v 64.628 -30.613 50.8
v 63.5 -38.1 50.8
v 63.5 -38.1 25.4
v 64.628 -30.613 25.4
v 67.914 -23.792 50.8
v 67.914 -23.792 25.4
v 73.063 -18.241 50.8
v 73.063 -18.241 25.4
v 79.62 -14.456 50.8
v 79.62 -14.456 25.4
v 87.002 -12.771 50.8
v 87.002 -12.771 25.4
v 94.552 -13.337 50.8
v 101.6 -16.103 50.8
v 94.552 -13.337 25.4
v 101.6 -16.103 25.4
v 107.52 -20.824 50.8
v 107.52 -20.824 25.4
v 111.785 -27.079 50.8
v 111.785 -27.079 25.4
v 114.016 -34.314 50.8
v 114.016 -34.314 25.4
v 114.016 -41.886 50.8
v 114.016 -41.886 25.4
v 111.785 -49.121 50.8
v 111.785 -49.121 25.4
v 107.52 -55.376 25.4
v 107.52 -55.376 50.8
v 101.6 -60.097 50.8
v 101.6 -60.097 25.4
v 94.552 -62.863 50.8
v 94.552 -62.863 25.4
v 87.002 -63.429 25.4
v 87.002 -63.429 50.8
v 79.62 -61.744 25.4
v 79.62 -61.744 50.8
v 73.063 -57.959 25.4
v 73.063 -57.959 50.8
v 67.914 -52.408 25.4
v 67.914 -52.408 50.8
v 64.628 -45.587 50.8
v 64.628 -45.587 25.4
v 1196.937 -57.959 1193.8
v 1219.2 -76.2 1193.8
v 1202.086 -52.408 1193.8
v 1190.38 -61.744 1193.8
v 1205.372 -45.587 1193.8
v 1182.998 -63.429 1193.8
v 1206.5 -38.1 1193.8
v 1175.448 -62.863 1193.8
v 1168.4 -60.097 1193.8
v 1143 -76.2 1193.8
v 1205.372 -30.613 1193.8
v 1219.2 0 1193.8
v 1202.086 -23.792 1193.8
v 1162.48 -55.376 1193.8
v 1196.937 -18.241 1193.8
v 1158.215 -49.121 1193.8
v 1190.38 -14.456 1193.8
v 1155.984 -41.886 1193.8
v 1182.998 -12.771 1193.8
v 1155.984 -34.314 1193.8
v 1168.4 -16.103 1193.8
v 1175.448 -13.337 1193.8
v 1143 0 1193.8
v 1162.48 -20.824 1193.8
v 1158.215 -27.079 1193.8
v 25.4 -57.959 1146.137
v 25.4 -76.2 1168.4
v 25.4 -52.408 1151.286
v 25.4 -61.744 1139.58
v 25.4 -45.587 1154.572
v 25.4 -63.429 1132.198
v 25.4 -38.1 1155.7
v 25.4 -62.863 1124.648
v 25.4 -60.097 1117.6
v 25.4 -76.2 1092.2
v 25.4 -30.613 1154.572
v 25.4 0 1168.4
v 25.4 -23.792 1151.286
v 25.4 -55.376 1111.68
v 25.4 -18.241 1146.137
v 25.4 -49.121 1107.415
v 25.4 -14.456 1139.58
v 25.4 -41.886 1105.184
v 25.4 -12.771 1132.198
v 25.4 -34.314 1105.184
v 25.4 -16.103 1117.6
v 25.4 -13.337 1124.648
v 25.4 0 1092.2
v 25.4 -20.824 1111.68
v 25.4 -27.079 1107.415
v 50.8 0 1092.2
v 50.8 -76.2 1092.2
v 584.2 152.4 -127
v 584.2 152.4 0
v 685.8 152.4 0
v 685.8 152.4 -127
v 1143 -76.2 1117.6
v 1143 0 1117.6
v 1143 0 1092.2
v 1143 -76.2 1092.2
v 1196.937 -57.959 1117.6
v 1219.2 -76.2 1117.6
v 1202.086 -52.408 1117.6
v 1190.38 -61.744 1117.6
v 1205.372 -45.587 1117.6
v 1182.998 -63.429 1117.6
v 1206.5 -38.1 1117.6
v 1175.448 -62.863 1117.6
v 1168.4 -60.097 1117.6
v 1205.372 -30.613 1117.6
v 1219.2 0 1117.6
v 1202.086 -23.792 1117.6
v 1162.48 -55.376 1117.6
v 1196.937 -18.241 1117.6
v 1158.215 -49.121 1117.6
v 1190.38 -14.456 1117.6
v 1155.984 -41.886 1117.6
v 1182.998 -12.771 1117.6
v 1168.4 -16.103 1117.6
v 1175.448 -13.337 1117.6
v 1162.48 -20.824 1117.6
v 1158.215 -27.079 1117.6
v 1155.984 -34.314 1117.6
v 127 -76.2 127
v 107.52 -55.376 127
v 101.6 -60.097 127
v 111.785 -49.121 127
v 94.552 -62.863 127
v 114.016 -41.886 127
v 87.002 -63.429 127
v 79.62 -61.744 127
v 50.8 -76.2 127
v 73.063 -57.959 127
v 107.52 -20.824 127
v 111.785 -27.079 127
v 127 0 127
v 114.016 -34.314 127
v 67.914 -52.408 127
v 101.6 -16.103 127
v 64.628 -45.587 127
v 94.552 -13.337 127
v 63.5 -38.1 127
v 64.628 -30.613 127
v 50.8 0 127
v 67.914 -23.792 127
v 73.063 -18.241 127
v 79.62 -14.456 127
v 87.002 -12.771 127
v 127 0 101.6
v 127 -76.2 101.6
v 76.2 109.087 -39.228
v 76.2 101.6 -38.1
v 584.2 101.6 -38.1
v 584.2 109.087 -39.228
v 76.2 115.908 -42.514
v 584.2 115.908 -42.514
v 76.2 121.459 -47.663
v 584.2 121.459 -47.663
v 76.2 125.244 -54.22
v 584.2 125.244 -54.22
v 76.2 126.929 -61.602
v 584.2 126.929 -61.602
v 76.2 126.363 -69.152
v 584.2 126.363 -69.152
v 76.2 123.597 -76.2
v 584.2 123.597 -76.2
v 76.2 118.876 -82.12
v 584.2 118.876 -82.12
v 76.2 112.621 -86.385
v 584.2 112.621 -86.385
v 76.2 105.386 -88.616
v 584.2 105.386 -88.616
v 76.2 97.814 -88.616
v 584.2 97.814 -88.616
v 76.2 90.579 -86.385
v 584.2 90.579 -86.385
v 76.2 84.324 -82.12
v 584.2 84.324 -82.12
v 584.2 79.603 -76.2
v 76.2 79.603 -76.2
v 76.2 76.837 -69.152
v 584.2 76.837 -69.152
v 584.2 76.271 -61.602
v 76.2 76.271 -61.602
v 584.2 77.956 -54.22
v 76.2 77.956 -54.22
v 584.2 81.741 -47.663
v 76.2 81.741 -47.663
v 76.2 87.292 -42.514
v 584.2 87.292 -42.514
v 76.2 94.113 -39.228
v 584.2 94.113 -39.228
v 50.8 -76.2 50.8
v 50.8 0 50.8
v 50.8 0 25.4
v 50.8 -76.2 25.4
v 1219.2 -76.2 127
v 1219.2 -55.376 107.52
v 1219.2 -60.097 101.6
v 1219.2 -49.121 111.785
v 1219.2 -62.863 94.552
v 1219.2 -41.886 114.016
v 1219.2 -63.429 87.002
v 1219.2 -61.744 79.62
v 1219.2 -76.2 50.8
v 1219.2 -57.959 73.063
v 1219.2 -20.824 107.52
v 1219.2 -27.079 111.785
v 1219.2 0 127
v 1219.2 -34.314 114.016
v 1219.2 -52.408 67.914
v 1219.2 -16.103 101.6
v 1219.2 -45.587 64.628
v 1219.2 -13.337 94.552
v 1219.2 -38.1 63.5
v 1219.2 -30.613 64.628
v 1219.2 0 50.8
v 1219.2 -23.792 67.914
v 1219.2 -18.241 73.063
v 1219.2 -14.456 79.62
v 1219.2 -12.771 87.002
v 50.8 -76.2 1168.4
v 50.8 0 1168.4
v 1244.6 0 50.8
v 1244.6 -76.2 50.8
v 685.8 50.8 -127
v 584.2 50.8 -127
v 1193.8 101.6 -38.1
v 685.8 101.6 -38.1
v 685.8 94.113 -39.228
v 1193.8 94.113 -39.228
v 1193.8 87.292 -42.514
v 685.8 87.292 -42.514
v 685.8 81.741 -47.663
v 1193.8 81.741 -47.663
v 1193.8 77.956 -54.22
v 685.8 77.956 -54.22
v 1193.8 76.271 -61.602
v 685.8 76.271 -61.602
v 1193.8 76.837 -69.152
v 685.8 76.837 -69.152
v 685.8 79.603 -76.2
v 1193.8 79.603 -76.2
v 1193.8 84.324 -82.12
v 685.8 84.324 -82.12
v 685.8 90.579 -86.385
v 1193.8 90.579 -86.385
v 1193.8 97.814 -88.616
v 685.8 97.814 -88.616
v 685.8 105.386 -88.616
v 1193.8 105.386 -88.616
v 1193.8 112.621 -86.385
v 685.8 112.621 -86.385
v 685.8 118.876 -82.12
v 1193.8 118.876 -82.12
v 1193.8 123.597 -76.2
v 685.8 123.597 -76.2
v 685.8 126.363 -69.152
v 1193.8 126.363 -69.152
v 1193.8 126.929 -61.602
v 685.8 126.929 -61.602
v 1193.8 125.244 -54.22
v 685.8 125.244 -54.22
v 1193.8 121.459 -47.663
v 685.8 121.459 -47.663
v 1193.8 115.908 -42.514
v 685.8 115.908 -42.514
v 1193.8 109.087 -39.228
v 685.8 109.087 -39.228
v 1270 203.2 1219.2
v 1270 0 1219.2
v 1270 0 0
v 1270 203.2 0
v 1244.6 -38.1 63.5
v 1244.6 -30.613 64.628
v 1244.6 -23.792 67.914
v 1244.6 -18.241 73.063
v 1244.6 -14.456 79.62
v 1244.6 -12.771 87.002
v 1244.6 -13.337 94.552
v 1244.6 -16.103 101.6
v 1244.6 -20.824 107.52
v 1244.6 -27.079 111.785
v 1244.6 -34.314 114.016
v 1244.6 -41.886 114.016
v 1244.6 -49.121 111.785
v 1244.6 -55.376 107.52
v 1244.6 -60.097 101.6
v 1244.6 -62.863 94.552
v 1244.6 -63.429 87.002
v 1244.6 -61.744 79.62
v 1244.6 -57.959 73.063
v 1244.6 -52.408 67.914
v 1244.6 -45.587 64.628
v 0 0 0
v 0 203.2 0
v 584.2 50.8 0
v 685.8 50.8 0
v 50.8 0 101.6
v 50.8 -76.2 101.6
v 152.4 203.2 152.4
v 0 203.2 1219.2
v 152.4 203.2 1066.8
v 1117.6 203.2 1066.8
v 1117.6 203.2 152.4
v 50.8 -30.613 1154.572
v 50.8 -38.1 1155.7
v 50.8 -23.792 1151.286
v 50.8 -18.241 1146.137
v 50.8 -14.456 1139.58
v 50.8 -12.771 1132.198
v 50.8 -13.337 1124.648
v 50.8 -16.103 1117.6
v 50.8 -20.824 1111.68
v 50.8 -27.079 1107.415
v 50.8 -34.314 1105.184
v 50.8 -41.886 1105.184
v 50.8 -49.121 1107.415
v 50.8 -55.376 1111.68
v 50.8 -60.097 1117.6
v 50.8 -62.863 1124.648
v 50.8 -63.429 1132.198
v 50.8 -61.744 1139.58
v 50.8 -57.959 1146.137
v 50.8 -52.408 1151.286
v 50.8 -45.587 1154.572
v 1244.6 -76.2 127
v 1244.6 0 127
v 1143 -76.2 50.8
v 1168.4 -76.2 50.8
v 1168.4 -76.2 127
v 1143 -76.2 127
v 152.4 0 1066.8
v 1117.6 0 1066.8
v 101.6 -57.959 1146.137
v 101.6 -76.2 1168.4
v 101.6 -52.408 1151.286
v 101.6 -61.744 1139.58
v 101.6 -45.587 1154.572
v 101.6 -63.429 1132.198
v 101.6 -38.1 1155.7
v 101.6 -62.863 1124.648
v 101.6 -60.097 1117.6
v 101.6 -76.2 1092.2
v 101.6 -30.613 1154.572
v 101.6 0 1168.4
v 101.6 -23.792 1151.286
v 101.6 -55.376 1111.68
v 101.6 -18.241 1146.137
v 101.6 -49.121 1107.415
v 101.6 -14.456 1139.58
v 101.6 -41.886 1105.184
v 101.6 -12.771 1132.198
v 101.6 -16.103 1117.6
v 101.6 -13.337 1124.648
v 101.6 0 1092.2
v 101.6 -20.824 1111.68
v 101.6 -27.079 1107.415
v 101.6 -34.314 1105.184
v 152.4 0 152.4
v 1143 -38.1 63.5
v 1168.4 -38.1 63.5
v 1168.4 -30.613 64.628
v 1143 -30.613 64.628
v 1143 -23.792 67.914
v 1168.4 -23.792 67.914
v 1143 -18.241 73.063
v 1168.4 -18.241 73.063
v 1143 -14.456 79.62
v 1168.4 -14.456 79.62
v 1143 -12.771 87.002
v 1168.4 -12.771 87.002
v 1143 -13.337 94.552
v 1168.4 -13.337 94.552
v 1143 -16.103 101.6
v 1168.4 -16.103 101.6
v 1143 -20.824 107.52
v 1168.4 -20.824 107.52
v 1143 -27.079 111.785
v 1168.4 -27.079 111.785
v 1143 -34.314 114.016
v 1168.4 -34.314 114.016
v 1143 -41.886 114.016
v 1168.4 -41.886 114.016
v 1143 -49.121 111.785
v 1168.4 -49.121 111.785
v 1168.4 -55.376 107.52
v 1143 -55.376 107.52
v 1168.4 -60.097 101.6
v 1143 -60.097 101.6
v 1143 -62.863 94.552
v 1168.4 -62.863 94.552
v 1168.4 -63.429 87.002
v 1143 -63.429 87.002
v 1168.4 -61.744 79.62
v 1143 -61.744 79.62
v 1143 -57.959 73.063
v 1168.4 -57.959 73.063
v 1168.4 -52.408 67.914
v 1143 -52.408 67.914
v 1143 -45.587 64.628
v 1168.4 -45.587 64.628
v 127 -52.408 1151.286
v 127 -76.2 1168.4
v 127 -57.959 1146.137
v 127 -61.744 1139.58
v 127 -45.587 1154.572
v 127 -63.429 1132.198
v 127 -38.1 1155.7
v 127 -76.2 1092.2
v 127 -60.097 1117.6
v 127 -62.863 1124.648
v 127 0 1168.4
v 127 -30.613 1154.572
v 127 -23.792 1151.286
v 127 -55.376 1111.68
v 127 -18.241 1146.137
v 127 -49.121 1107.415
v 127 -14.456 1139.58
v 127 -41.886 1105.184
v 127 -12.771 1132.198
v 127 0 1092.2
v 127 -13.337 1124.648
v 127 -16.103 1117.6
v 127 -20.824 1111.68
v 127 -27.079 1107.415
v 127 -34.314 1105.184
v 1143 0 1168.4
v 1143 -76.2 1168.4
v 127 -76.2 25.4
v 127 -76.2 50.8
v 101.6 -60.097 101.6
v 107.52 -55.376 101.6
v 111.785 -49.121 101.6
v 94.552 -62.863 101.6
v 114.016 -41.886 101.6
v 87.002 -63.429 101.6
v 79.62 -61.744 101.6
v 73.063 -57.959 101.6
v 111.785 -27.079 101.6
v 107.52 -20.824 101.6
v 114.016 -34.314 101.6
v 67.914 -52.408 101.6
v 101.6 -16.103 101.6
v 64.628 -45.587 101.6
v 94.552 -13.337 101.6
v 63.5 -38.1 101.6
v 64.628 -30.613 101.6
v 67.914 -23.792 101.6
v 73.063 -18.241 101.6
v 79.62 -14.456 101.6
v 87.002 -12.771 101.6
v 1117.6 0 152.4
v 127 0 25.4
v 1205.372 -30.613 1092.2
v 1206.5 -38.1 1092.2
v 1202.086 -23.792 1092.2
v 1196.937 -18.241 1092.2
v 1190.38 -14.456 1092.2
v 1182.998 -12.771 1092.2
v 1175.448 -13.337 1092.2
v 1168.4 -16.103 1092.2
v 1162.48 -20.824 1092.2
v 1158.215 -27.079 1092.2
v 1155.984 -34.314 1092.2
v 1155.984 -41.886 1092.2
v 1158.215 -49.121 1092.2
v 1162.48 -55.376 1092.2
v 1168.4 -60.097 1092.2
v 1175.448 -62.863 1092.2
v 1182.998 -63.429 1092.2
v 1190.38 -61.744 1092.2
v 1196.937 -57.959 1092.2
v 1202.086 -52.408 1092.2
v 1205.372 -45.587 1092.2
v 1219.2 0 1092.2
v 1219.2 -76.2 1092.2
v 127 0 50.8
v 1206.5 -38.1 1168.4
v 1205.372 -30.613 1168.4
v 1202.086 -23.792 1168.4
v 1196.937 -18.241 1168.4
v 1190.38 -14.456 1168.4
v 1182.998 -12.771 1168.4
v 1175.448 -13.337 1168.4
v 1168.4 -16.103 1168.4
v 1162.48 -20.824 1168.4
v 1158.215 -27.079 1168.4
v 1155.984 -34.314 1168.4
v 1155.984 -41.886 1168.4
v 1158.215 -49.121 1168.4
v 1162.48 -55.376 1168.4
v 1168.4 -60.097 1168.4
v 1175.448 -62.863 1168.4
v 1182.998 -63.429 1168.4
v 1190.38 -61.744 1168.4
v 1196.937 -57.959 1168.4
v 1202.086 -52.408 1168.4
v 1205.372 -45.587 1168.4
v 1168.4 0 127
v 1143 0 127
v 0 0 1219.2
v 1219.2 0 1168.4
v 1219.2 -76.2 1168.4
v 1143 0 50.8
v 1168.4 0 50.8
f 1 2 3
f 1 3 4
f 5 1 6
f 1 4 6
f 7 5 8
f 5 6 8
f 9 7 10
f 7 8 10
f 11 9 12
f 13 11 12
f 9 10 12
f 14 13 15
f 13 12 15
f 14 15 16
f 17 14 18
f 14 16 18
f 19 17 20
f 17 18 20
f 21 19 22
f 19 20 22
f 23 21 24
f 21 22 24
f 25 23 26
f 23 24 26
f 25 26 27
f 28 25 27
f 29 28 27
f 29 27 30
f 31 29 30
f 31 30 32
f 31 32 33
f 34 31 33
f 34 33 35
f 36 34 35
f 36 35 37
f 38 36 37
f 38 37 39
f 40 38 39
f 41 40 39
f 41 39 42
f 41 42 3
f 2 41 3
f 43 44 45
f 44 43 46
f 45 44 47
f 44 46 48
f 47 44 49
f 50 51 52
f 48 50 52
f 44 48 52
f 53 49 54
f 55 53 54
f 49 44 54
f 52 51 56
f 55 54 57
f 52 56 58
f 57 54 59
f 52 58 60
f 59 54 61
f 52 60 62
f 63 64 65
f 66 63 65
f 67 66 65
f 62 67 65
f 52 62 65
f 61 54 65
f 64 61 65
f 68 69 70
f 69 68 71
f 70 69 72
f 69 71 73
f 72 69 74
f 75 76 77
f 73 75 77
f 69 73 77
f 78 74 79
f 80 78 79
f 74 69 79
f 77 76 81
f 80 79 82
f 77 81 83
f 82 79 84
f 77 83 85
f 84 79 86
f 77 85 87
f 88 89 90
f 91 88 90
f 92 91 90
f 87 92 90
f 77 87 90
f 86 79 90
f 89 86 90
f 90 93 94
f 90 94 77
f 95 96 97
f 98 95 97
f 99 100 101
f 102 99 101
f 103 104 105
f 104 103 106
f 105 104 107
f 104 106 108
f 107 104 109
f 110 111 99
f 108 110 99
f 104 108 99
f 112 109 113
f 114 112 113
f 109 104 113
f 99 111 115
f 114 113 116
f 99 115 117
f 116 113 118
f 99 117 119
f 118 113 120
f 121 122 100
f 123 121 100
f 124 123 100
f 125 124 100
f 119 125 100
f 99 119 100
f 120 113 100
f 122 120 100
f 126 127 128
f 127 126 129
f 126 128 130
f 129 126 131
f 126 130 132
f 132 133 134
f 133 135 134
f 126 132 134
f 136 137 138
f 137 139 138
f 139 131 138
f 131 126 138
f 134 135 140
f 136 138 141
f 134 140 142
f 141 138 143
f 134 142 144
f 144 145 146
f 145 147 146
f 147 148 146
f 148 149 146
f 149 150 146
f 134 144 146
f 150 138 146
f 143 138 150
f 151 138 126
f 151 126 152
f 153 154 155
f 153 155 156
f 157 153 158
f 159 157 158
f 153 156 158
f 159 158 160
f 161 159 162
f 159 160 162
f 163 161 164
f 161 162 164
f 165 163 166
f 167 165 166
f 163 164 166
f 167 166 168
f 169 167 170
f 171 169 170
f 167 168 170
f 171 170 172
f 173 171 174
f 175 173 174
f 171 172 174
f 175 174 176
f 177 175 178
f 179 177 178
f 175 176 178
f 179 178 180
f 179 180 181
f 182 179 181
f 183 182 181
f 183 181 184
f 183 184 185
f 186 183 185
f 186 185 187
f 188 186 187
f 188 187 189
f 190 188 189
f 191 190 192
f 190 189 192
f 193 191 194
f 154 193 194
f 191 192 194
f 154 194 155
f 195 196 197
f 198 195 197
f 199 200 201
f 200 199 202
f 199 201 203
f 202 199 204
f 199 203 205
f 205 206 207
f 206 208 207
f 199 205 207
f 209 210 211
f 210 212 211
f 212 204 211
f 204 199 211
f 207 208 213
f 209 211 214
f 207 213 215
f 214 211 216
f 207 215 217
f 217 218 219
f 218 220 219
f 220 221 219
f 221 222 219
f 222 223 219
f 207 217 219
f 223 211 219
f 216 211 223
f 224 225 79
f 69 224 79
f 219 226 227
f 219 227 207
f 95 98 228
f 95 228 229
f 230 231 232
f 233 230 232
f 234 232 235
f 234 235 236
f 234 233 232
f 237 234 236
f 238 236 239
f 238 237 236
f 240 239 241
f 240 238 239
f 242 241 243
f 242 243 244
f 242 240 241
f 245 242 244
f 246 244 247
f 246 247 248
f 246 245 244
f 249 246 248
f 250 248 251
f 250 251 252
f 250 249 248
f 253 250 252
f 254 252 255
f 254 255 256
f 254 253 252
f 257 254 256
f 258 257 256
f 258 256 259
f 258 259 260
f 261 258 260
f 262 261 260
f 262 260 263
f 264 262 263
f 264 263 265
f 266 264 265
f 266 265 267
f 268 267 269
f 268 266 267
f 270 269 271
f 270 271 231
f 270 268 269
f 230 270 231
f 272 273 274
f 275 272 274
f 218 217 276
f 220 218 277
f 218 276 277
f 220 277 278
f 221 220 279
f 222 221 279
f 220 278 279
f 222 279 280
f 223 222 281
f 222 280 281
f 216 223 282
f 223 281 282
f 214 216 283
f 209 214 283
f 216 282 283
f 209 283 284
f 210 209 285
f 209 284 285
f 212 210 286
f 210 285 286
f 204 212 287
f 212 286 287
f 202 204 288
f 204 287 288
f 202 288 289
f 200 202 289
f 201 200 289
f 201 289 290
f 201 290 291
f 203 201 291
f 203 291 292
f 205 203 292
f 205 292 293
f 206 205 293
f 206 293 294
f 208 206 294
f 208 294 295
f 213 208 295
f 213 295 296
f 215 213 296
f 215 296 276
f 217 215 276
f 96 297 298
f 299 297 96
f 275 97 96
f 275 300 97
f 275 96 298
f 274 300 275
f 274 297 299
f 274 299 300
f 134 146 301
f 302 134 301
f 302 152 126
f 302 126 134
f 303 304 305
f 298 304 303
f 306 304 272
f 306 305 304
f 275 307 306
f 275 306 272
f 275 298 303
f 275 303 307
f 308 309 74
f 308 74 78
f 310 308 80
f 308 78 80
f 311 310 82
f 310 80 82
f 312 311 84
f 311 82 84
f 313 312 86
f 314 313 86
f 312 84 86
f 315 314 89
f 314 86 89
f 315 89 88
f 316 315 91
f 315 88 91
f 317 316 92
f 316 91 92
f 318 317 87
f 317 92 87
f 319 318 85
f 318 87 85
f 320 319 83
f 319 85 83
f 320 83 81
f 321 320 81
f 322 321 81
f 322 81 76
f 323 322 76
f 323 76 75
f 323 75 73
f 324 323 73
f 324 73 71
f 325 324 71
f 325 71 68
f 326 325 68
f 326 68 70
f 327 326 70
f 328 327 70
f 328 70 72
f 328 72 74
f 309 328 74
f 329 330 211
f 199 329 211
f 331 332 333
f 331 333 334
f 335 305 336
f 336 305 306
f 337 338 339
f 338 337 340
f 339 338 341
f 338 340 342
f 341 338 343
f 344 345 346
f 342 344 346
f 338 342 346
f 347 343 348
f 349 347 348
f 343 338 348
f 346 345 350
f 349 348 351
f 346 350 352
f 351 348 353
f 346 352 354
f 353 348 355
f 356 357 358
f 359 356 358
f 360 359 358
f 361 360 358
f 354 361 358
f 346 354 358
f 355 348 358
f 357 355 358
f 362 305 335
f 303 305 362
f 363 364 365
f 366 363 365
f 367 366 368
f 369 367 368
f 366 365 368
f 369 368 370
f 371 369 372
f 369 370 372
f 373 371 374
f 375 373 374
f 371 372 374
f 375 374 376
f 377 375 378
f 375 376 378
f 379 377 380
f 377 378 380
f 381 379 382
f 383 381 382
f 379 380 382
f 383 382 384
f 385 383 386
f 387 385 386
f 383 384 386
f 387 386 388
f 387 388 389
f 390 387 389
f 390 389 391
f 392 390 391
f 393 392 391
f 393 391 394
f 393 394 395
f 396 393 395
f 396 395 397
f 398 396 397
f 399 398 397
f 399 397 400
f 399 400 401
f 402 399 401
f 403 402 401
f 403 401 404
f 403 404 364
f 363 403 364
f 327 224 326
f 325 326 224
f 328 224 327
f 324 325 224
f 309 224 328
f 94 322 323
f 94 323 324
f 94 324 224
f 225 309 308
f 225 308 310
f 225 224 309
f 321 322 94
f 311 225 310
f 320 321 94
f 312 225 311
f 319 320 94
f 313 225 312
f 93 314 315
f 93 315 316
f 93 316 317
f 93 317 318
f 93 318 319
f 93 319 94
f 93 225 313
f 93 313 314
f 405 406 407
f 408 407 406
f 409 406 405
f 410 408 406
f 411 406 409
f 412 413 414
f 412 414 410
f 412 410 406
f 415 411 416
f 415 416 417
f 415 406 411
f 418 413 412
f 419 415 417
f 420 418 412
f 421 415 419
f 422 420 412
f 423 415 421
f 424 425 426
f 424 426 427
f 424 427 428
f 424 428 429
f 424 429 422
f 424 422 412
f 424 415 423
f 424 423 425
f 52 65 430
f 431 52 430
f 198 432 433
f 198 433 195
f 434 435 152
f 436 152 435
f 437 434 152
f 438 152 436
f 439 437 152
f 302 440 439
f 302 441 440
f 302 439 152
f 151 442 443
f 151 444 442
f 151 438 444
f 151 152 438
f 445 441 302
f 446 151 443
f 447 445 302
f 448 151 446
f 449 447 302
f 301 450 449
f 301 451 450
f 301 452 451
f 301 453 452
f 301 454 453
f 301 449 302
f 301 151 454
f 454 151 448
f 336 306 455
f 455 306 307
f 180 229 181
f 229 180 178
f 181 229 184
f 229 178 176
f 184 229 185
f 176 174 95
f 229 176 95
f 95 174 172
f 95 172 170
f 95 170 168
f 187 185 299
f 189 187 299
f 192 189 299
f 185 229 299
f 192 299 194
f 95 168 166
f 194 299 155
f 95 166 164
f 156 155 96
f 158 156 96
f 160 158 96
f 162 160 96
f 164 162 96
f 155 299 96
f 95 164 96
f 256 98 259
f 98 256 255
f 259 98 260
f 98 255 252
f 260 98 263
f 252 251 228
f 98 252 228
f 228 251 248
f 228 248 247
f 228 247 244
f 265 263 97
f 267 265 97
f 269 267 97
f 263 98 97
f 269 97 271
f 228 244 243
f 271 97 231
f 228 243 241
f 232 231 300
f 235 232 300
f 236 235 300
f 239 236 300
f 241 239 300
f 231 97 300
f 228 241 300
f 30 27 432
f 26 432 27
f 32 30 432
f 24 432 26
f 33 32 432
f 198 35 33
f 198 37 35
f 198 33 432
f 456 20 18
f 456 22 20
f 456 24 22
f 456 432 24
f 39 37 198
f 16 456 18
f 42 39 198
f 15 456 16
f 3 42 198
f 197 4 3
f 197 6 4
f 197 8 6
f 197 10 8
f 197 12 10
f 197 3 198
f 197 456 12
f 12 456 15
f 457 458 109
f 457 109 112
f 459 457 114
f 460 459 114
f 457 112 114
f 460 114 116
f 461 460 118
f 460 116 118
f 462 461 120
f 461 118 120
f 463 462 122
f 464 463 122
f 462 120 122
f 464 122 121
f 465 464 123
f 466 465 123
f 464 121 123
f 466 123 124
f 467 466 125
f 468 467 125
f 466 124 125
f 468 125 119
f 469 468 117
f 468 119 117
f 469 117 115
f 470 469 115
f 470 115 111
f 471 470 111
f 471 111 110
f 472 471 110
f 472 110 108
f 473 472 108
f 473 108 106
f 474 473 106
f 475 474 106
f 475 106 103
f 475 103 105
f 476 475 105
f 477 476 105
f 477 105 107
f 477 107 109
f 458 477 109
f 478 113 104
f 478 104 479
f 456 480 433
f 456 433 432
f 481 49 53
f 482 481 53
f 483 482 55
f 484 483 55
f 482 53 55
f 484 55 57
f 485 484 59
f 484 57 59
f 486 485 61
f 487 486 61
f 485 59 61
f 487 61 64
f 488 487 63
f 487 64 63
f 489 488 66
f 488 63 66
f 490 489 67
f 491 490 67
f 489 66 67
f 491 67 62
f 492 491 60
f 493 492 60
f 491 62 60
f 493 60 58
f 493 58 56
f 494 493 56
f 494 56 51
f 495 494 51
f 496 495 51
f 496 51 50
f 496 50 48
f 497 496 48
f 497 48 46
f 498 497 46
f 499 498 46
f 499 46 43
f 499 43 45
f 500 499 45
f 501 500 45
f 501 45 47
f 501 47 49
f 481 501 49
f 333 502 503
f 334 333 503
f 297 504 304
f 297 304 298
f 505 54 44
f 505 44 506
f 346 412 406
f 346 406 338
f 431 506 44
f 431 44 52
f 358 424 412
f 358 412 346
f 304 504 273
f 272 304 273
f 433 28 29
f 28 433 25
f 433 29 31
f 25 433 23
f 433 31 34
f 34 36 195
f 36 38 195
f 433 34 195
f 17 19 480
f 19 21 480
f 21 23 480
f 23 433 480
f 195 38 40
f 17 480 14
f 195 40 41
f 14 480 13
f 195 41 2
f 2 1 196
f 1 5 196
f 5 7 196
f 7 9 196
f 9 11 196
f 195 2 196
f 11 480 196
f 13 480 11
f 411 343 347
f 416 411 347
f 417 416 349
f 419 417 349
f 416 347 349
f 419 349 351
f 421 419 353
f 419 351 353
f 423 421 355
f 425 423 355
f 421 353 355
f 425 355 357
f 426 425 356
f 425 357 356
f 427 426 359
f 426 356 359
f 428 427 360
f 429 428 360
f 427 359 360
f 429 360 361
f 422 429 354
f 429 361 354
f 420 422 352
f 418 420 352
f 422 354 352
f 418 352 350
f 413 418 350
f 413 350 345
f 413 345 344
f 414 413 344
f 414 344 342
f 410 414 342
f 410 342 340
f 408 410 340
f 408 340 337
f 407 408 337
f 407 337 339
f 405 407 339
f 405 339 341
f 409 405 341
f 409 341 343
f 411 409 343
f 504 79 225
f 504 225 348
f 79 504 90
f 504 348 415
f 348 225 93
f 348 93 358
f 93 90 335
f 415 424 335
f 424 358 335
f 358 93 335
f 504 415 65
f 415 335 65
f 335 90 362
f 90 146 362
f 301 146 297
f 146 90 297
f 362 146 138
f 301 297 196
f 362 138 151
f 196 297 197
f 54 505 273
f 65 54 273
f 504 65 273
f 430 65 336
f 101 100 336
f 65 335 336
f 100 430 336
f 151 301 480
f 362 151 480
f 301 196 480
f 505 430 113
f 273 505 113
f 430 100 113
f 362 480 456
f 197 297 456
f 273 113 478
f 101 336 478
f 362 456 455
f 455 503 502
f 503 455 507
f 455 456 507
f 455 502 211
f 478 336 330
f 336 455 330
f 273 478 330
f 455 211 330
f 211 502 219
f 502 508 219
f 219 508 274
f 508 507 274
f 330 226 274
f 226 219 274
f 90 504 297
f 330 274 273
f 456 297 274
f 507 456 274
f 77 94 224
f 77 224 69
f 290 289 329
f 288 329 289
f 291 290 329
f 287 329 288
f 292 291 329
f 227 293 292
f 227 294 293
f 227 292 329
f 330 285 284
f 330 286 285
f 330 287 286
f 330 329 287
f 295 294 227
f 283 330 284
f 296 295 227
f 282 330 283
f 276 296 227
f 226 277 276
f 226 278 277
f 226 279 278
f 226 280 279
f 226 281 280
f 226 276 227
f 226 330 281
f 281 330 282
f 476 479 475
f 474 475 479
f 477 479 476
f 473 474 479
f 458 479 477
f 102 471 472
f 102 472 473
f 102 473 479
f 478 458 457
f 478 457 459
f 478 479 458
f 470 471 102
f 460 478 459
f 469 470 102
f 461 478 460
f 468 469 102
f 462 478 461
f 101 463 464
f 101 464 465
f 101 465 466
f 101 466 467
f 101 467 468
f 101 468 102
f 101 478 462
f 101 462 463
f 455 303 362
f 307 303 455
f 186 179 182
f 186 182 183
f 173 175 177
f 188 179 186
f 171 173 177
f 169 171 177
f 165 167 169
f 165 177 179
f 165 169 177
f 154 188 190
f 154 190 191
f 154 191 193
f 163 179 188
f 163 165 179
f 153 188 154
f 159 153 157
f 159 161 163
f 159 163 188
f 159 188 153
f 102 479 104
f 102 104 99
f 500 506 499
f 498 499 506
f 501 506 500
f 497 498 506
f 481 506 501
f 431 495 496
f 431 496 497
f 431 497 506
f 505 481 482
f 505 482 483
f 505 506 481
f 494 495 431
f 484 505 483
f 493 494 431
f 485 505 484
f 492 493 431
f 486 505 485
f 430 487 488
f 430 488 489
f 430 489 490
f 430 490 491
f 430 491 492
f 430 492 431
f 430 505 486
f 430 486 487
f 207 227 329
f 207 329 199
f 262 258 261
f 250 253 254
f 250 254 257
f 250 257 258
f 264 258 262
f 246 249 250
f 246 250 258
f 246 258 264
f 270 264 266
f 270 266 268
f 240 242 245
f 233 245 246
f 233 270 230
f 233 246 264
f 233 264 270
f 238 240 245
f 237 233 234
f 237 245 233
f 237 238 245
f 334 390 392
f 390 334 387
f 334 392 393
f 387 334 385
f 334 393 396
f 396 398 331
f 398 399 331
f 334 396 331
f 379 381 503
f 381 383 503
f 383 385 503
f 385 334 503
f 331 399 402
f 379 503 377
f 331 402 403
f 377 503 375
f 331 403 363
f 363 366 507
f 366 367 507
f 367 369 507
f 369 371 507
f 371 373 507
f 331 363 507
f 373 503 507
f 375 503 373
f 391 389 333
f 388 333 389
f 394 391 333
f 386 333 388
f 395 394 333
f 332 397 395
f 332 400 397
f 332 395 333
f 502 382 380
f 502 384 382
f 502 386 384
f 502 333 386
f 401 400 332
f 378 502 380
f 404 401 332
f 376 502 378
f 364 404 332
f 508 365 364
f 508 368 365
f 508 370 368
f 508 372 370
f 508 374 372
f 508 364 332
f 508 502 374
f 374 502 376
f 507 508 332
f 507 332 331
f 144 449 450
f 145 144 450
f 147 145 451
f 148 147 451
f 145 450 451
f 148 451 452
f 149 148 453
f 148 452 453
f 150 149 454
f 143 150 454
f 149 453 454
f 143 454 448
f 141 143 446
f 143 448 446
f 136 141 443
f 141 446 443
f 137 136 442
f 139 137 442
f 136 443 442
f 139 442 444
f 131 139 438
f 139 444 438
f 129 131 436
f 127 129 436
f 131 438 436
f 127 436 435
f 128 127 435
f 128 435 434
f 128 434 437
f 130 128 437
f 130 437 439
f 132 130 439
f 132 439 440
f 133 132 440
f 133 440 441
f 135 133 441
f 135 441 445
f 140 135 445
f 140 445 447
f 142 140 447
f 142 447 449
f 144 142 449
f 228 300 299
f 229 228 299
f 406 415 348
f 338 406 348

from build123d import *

# Parameters (mm, degrees)
SKETCH1_W           = 1270
SKETCH1_H           = 1219.2
BOSS_EXTRUDE1_DEPTH = 203.2
SKETCH2_W           = 965.2
SKETCH2_H           = 914.4
CUT_EXTRUDE2_DEPTH  = 203.2
SKETCH4_W           = 25.4
SKETCH4_H           = 76.2
SKETCH4_W_2         = 76.2
SKETCH4_H_2         = 25.4
BOSS_EXTRUDE2_DEPTH = 76.2
SKETCH6_R           = 25.4
CUT_EXTRUDE3_DEPTH  = 127
SKETCH7_R           = 25.4
CUT_EXTRUDE4_DEPTH  = 127
SKETCH8_R           = 25.4
CUT_EXTRUDE5_DEPTH  = 127
SKETCH9_R           = 25.4
CUT_EXTRUDE6_DEPTH  = 127
BOSS_EXTRUDE3_DEPTH = 127
SKETCH11_R          = 25.4
BOSS_EXTRUDE4_DEPTH = 508
BOSS_EXTRUDE5_START = 508
SKETCH12_R          = 25.4
BOSS_EXTRUDE5_DEPTH = 508


with BuildPart() as part:
    # Sketch1 → Boss-Extrude1 (new body)
    with BuildSketch(Plane(origin=(0, 0, 0), x_dir=(1, 0, 0), z_dir=(0, 1, 0))):
        with Locations((635, -609.6)):
            Rectangle(SKETCH1_W, SKETCH1_H)
    extrude(amount=BOSS_EXTRUDE1_DEPTH)

    # Sketch2 → Cut-Extrude2 (cut)
    with BuildSketch(Plane(origin=(0, 203.2, 0), x_dir=(1, 0, 0), z_dir=(0, 1, 0))):
        with Locations((635, -609.6)):
            Rectangle(SKETCH2_W, SKETCH2_H)
    extrude(amount=-CUT_EXTRUDE2_DEPTH, mode=Mode.SUBTRACT)

    # Sketch4 → Boss-Extrude2 (add)
    with BuildSketch(Plane(origin=(0, 0, 0), x_dir=(-1, 0, 0), z_dir=(0, -1, 0))):
        with Locations((-38.1, -1130.3)):
            Rectangle(SKETCH4_W, SKETCH4_H)
        with Locations((-114.3, -1130.3)):
            Rectangle(SKETCH4_W, SKETCH4_H)
        with Locations((-1181.1, -1181.1)):
            Rectangle(SKETCH4_W_2, SKETCH4_H_2)
        with Locations((-1181.1, -1104.9)):
            Rectangle(SKETCH4_W_2, SKETCH4_H_2)
        with Locations((-1231.9, -88.9)):
            Rectangle(SKETCH4_W, SKETCH4_H)
        with Locations((-1155.7, -88.9)):
            Rectangle(SKETCH4_W, SKETCH4_H)
        with Locations((-88.9, -114.3)):
            Rectangle(SKETCH4_W_2, SKETCH4_H_2)
        with Locations((-88.9, -38.1)):
            Rectangle(SKETCH4_W_2, SKETCH4_H_2)
    extrude(amount=BOSS_EXTRUDE2_DEPTH)

    # Sketch6 → Cut-Extrude3 (cut)
    with BuildSketch(Plane.ZY.offset(-25.4)):
        with Locations((1130.3, -38.1)):
            Circle(SKETCH6_R)
    extrude(amount=-CUT_EXTRUDE3_DEPTH, mode=Mode.SUBTRACT)

    # Sketch7 → Cut-Extrude4 (cut)
    with BuildSketch(Plane.XY.offset(1193.8)):
        with Locations((1181.1, -38.1)):
            Circle(SKETCH7_R)
    extrude(amount=-CUT_EXTRUDE4_DEPTH, mode=Mode.SUBTRACT)

    # Sketch8 → Cut-Extrude5 (cut)
    with BuildSketch(Plane(origin=(1244.6, 0, 0), x_dir=(0, 0, -1), z_dir=(1, 0, 0))):
        with Locations((-88.9, -38.1)):
            Circle(SKETCH8_R)
    extrude(amount=-CUT_EXTRUDE5_DEPTH, mode=Mode.SUBTRACT)

    # Sketch9 → Cut-Extrude6 (cut)
    with BuildSketch(Plane(origin=(0, 0, 25.4), x_dir=(-1, 0, 0), z_dir=(0, 0, -1))):
        with Locations((-88.9, -38.1)):
            Circle(SKETCH9_R)
    extrude(amount=-CUT_EXTRUDE6_DEPTH, mode=Mode.SUBTRACT)

    # Sketch10 → Boss-Extrude3 (add)
    with BuildSketch(Plane(origin=(0, 0, 0), x_dir=(-1, 0, 0), z_dir=(0, 0, -1))):
        Polygon((-584.2, 152.4), (-635, 152.4), (-685.8, 152.4), (-685.8, 50.8), (-584.2, 50.8), align=None)
    extrude(amount=BOSS_EXTRUDE3_DEPTH)

    # Sketch11 → Boss-Extrude4 (add)
    with BuildSketch(Plane.ZY.offset(-584.2)):
        with Locations((-63.5, 101.6)):
            Circle(SKETCH11_R)
    extrude(amount=BOSS_EXTRUDE4_DEPTH)

    # Sketch12 → Boss-Extrude5 (add)
    with BuildSketch(Plane(origin=(685.8, 0, 0), x_dir=(0, 0, -1), z_dir=(1, 0, 0)).offset(BOSS_EXTRUDE5_START)):
        with Locations(Location((63.5, 101.6, 0), (0, 0, 180))):
            Circle(SKETCH12_R)
    extrude(amount=-BOSS_EXTRUDE5_DEPTH)


solid = part.part
